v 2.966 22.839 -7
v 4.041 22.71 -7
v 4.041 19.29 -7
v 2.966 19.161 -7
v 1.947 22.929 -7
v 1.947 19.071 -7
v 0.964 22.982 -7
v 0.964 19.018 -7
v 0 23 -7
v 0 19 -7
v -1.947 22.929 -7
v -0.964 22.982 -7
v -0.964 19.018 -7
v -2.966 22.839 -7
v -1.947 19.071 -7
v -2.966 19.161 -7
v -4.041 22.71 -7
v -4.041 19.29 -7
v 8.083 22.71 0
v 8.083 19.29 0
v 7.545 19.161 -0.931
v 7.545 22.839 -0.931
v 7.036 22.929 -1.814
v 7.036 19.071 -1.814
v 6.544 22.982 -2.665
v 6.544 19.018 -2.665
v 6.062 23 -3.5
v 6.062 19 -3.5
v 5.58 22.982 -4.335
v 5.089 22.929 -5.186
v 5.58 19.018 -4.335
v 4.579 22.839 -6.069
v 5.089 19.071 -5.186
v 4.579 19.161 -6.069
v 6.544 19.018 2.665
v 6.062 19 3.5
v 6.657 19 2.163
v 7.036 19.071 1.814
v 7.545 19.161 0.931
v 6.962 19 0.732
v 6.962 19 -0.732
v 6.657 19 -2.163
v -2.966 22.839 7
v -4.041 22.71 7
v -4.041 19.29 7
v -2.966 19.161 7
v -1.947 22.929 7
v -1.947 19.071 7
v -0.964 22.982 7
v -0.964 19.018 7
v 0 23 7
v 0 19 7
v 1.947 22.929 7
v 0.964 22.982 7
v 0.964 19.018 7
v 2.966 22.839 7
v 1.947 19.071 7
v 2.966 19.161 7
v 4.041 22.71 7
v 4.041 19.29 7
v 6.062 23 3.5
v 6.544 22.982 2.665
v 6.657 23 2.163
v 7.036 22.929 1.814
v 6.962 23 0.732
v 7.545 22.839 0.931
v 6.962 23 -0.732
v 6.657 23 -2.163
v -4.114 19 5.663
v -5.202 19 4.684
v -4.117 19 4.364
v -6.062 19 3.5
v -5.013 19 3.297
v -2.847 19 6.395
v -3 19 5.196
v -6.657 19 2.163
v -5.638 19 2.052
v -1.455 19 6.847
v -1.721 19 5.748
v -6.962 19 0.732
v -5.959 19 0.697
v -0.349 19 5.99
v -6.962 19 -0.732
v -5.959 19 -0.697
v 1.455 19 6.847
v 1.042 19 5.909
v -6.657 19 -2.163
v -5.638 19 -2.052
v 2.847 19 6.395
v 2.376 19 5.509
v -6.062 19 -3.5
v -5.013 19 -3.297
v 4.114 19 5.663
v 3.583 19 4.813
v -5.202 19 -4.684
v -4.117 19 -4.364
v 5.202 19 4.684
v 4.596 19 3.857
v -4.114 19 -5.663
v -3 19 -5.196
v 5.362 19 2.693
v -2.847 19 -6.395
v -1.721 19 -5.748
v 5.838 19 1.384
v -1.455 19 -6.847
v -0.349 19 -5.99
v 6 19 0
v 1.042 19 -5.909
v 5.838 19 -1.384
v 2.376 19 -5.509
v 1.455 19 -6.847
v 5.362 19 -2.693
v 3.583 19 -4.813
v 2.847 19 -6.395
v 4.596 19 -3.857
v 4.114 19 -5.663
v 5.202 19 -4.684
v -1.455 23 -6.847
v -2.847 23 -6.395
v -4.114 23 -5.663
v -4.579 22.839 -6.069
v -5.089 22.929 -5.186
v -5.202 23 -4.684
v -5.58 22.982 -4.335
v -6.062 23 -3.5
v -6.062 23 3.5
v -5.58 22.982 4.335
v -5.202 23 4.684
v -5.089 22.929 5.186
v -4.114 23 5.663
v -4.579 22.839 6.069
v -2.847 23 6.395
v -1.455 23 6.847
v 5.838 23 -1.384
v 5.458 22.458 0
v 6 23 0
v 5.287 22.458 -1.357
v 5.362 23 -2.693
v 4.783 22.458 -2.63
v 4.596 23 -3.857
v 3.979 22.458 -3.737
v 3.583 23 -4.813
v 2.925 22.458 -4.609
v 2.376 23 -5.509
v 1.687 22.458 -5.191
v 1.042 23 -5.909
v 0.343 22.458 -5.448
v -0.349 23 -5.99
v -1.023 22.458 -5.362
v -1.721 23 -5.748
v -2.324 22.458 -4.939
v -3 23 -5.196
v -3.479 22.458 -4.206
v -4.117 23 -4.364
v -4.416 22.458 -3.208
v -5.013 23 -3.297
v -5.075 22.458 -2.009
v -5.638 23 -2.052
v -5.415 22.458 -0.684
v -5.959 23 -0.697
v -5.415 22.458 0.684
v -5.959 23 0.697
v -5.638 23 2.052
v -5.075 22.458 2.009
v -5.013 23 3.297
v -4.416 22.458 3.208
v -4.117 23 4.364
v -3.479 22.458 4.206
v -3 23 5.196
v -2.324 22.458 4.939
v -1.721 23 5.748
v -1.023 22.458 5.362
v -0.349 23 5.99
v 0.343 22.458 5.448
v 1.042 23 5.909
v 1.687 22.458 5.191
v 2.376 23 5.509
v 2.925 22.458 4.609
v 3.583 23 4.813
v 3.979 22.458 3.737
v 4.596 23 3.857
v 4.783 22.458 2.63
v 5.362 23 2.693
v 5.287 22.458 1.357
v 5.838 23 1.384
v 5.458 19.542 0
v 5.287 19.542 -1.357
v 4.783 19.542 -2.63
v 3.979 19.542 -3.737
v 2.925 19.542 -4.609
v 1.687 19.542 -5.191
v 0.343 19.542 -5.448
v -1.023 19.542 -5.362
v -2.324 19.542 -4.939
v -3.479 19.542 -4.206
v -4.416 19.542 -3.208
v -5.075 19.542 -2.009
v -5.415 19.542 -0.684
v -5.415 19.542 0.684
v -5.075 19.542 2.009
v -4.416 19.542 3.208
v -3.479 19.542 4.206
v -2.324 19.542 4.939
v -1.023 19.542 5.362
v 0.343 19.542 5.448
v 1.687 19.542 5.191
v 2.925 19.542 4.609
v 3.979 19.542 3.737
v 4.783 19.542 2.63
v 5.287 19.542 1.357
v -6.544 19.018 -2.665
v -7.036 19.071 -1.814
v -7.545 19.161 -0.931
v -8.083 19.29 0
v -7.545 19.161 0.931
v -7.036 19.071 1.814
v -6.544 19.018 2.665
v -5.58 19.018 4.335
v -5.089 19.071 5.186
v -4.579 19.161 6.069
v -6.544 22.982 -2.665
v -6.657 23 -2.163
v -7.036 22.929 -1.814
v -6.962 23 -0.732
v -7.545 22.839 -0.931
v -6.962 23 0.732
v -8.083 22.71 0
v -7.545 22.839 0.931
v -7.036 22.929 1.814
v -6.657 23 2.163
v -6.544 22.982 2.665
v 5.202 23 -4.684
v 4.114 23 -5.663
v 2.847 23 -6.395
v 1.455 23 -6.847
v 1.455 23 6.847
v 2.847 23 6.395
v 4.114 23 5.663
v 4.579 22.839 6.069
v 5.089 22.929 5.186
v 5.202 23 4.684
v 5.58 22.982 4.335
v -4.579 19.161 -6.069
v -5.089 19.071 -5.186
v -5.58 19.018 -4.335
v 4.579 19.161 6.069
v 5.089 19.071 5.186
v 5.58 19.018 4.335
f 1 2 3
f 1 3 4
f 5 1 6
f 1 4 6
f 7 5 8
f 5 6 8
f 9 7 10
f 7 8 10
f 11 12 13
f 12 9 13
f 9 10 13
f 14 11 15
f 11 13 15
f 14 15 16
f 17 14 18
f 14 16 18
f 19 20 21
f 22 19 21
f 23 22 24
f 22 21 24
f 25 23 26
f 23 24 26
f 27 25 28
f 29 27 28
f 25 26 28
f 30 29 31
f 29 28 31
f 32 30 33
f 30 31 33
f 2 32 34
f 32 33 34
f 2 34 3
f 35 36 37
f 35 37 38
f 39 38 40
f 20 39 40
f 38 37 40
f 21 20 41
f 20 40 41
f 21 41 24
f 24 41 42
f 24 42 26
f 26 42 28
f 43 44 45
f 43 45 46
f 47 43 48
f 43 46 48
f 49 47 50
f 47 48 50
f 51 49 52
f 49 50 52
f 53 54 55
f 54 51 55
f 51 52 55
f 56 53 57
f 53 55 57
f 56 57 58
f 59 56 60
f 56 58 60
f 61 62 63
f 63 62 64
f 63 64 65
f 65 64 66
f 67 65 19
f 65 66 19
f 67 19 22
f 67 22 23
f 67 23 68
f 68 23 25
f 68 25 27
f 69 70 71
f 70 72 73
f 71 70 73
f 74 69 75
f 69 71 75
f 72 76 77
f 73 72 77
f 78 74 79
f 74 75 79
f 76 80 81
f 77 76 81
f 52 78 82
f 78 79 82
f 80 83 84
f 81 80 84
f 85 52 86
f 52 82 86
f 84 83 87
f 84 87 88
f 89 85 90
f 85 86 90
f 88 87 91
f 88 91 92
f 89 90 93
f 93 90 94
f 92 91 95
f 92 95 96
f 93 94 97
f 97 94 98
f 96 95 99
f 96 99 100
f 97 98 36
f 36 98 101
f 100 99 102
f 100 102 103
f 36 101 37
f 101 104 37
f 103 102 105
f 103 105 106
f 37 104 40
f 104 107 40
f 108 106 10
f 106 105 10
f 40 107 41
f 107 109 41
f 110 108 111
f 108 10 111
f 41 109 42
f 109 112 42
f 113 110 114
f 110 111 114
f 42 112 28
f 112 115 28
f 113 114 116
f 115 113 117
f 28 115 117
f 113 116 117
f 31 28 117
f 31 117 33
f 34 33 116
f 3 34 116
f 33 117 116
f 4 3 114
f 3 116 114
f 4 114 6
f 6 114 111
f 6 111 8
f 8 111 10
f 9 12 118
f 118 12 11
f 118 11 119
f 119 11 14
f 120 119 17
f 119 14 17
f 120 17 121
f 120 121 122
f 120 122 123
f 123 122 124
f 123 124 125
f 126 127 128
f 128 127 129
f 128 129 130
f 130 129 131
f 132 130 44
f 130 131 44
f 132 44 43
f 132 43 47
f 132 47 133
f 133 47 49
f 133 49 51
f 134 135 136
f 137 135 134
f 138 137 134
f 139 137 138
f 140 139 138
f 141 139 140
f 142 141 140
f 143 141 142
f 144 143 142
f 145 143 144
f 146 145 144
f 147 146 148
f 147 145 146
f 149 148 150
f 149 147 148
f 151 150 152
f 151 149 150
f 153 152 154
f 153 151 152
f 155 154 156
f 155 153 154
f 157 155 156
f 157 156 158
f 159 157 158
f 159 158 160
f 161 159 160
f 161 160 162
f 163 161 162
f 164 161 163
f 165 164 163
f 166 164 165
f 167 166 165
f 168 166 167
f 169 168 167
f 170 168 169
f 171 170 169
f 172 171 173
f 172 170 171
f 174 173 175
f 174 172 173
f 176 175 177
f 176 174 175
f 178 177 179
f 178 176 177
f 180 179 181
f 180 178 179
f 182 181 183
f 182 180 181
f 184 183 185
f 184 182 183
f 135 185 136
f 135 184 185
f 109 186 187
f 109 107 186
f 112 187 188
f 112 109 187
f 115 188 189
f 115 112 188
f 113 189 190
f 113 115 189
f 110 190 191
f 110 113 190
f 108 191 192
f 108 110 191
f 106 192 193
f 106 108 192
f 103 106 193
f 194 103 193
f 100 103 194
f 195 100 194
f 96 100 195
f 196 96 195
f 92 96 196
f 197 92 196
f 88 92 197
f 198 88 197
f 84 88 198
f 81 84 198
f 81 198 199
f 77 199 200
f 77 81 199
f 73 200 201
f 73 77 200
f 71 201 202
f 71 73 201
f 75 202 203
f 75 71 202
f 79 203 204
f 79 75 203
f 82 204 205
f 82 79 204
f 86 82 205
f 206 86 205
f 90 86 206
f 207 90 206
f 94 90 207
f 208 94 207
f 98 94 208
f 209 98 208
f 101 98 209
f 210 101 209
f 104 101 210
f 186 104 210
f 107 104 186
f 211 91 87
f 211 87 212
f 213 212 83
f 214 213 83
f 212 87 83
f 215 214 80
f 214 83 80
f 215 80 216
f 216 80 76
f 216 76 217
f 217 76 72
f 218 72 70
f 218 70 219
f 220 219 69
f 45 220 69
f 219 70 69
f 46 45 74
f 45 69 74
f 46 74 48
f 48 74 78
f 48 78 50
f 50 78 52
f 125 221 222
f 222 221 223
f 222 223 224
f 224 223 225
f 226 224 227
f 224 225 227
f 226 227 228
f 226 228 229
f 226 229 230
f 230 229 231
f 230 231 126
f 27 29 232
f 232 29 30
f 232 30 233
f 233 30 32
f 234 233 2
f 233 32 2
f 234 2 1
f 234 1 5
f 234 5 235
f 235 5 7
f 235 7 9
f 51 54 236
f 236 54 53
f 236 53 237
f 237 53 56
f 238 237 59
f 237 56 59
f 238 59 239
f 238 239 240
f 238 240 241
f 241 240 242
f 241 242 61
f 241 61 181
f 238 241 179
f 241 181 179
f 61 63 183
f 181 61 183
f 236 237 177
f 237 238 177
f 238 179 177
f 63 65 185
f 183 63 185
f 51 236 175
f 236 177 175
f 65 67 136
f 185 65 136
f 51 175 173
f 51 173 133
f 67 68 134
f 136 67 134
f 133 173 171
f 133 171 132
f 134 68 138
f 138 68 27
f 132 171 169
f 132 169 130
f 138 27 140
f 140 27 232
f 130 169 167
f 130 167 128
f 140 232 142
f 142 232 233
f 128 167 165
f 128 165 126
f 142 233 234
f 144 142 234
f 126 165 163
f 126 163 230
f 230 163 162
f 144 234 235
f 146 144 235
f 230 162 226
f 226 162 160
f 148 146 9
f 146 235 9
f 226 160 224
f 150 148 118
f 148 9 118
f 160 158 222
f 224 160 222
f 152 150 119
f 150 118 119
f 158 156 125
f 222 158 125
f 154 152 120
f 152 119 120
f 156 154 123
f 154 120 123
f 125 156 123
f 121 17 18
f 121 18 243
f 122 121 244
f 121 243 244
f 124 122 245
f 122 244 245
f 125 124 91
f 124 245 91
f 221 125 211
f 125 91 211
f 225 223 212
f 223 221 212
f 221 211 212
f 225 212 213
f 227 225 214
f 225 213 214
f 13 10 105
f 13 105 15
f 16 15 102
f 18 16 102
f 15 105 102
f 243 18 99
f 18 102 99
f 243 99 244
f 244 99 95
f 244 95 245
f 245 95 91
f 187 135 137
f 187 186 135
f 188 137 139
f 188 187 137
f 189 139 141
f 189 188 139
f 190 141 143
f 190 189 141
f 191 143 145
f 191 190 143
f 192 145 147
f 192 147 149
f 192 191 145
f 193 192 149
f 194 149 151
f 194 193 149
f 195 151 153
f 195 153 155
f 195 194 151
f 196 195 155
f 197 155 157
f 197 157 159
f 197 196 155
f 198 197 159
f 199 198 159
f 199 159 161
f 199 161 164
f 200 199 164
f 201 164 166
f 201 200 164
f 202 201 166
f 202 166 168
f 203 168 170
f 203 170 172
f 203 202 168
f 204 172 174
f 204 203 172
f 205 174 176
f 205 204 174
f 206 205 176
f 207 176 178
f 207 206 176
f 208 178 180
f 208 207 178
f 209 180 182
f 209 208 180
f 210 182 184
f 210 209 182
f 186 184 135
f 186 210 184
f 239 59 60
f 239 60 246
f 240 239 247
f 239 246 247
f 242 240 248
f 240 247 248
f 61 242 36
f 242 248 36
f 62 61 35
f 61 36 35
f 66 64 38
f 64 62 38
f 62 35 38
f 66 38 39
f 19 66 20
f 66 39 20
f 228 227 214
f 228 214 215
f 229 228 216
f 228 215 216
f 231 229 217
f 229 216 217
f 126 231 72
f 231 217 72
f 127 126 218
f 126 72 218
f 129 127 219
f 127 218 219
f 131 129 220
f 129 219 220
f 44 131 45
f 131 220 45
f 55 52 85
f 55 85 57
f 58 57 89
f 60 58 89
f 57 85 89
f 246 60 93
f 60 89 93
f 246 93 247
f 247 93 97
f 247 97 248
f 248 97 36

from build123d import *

# Parameters (mm, degrees)
SKETCH3_W          = 68
SKETCH3_H          = 68
CUT_EXTRUDE1_DEPTH = 4


with BuildPart() as part:
    # Sketch1 → Revolve1 (revolve)
    with BuildSketch(Plane.XY):
        Polygon((0, 23), (7, 23), (8.4, 22.624871131), (8.4, 19.375128869), (7, 19), (0, 19), align=None)
    revolve(axis=Axis((0, 19, 0), (0, 1, 0)))

    # Sketch2 → Cut-Revolve1 (revolve, cut)
    with BuildSketch(Plane.XY):
        Polygon((0, 23), (6, 23), (5.4585, 22.4585), (5.4585, 19.5415), (6, 19), (0, 19), align=None)
    revolve(axis=Axis((0, 19, 0), (0, 1, 0)), mode=Mode.SUBTRACT)

    # Sketch3 → Cut-Extrude1 (cut)
    with BuildSketch(Plane(origin=(0, 19, 0), x_dir=(-1, 0, 0), z_dir=(0, 1, 0))):
        Rectangle(SKETCH3_W, SKETCH3_H)
        Polygon((8.082903769, 0), (4.041451884, 7), (-4.041451884, 7), (-8.082903769, 0), (-4.041451884, -7), (4.041451884, -7), align=None, mode=Mode.SUBTRACT)
    extrude(amount=CUT_EXTRUDE1_DEPTH, mode=Mode.SUBTRACT)


solid = part.part
